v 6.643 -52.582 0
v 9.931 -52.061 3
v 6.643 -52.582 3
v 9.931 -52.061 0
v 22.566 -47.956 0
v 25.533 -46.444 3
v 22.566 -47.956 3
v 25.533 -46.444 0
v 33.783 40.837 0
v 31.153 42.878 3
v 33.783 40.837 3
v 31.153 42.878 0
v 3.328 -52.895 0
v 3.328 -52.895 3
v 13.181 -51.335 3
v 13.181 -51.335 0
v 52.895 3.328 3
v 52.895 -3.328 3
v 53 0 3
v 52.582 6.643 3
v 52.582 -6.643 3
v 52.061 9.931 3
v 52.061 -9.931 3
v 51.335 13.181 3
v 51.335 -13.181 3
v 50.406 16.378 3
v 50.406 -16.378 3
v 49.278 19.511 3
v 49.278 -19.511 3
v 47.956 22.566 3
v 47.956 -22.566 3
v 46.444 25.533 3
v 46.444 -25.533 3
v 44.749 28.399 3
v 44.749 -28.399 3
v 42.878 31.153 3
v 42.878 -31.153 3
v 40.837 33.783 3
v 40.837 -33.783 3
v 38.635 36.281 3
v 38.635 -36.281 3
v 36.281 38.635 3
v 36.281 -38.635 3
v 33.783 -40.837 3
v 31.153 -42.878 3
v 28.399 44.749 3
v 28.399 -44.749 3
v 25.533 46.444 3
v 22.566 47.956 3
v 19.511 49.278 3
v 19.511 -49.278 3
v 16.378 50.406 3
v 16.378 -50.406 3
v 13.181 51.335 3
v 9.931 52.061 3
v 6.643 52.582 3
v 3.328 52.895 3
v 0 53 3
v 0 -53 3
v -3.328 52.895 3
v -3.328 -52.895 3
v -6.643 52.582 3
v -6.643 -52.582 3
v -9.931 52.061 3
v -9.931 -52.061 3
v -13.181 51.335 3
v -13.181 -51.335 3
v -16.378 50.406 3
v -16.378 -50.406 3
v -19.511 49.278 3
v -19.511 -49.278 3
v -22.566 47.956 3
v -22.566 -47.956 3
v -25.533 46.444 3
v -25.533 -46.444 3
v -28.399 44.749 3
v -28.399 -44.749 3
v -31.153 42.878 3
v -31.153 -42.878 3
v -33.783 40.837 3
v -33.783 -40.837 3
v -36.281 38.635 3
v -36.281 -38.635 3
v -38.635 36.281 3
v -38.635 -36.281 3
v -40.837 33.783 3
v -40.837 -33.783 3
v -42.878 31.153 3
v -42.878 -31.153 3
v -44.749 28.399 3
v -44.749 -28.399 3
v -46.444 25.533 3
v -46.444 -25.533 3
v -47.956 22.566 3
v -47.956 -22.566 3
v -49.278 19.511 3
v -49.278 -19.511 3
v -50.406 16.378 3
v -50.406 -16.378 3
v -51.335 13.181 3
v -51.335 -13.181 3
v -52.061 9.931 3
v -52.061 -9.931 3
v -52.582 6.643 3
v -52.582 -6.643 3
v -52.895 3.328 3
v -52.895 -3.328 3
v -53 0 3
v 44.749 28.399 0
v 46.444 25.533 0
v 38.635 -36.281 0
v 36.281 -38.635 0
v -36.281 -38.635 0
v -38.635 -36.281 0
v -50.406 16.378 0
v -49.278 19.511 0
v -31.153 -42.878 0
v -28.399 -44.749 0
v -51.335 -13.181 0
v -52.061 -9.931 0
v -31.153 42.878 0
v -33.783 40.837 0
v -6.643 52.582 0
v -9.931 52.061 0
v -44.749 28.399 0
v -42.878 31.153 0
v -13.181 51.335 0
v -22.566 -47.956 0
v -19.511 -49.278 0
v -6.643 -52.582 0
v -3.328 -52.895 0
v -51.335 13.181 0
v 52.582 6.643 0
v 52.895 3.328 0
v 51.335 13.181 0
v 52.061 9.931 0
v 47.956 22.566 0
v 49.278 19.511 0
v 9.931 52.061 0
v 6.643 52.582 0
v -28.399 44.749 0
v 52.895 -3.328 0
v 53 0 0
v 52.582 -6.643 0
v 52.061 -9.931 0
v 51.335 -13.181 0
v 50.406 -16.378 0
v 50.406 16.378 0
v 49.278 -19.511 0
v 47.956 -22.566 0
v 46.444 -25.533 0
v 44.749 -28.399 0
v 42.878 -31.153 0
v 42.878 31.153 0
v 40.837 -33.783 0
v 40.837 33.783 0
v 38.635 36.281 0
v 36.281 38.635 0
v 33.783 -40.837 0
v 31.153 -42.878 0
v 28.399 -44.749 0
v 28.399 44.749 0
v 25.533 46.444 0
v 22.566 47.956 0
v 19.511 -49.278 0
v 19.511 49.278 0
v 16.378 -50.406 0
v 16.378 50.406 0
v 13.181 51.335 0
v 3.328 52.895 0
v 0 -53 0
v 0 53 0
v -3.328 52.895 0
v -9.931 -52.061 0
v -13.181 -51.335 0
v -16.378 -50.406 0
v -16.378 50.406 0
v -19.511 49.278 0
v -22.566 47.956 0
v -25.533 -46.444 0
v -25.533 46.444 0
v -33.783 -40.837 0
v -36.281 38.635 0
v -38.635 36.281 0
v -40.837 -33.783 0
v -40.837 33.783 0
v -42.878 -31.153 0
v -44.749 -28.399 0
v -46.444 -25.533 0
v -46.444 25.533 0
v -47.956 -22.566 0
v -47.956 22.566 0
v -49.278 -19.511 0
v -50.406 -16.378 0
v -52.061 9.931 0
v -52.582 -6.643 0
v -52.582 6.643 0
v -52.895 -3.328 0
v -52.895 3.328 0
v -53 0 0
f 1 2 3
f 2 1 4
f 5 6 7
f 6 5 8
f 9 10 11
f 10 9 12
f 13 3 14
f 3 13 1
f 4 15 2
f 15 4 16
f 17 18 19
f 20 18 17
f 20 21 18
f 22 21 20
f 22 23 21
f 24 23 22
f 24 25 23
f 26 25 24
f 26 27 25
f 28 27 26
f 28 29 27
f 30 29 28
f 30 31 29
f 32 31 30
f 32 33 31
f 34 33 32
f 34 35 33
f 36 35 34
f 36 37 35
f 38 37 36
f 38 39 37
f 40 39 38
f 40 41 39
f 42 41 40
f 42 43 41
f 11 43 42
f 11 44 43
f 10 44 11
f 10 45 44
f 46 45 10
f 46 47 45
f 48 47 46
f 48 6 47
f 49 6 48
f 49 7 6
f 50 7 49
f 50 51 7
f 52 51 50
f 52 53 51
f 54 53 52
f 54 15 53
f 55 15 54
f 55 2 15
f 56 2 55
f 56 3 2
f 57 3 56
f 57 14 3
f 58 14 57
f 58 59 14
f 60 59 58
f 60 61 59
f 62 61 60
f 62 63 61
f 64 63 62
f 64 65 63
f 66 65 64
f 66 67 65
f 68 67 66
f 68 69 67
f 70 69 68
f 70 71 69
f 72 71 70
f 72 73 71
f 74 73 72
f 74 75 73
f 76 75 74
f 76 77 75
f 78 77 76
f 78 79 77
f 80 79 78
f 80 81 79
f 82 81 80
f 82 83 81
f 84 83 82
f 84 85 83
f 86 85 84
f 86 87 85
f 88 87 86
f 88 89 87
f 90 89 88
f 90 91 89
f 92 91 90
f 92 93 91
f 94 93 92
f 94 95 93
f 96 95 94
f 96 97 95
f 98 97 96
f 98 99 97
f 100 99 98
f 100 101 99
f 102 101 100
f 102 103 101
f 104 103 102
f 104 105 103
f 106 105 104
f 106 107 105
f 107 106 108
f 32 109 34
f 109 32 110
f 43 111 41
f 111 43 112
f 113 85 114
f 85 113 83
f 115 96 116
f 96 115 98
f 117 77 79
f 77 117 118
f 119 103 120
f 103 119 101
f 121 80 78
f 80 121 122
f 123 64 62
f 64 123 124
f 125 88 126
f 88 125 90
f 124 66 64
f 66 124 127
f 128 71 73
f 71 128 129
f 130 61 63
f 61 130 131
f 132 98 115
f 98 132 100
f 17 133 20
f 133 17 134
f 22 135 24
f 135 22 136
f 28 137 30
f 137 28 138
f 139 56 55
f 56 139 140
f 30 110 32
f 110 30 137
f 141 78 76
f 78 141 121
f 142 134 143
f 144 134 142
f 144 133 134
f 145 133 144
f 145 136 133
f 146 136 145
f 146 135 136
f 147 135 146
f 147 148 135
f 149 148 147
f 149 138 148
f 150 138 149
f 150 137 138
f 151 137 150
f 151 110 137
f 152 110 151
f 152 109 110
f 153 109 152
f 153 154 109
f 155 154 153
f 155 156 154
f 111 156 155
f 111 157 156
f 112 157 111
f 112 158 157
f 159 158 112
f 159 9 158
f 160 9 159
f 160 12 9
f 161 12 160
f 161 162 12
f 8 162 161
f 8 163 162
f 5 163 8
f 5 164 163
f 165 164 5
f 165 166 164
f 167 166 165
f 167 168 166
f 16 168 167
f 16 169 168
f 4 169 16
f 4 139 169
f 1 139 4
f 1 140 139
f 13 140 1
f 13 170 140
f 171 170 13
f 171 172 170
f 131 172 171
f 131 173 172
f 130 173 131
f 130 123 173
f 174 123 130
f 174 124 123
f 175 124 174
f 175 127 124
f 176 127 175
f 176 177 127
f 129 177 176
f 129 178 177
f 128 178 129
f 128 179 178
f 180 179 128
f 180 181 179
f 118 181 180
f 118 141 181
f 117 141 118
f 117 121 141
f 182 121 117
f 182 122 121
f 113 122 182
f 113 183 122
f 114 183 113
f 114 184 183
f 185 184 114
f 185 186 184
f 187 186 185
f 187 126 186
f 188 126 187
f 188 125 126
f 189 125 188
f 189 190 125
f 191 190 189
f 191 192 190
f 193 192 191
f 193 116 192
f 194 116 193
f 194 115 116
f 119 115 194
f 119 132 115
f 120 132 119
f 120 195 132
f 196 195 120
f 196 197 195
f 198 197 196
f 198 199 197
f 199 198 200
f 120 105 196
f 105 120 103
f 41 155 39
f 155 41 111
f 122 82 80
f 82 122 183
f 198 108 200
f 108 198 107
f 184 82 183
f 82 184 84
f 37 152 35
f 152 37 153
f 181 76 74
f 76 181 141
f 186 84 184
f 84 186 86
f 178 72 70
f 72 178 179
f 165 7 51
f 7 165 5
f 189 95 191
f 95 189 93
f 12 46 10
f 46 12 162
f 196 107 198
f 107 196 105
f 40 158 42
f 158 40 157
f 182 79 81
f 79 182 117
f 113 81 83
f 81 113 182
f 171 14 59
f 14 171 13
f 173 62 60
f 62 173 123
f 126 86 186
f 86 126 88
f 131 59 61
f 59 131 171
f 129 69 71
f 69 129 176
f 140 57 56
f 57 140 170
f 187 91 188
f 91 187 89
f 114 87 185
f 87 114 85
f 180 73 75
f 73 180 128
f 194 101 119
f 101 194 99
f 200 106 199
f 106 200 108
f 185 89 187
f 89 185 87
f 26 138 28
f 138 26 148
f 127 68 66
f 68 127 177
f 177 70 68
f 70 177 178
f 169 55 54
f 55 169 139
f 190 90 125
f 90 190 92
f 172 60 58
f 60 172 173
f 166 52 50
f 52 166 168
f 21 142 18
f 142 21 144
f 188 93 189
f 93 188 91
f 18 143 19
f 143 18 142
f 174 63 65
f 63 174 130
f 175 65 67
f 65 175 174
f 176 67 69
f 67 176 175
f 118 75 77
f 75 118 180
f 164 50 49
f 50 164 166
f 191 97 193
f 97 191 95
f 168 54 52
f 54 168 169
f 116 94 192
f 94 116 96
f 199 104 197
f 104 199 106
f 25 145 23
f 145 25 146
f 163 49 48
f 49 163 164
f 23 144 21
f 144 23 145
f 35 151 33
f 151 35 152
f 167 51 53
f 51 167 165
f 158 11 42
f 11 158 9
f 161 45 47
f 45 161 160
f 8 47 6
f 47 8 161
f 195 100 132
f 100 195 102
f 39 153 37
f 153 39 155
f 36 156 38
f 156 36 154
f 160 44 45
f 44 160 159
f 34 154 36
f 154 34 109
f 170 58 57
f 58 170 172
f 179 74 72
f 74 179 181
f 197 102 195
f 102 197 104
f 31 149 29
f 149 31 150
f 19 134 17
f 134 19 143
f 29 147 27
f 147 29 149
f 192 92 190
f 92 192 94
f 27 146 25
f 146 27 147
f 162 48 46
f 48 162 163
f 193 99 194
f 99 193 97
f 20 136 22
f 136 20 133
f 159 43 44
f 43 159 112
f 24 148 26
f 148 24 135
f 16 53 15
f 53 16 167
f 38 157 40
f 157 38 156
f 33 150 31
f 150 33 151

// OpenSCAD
r = 50;

base_th = 2;
model_th = 1;
border_th = 3;

module figura() translate([1,1]*-r) import("logo.dxf");

module inv() {
    difference() {
        circle(r=r+border_th, $fn=100);
        figura();
    }
}

color([1,1,1]) linear_extrude(model_th+base_th) inv();
color([0,143,204]/255.) cylinder($fn=50, r=r, h=base_th);
